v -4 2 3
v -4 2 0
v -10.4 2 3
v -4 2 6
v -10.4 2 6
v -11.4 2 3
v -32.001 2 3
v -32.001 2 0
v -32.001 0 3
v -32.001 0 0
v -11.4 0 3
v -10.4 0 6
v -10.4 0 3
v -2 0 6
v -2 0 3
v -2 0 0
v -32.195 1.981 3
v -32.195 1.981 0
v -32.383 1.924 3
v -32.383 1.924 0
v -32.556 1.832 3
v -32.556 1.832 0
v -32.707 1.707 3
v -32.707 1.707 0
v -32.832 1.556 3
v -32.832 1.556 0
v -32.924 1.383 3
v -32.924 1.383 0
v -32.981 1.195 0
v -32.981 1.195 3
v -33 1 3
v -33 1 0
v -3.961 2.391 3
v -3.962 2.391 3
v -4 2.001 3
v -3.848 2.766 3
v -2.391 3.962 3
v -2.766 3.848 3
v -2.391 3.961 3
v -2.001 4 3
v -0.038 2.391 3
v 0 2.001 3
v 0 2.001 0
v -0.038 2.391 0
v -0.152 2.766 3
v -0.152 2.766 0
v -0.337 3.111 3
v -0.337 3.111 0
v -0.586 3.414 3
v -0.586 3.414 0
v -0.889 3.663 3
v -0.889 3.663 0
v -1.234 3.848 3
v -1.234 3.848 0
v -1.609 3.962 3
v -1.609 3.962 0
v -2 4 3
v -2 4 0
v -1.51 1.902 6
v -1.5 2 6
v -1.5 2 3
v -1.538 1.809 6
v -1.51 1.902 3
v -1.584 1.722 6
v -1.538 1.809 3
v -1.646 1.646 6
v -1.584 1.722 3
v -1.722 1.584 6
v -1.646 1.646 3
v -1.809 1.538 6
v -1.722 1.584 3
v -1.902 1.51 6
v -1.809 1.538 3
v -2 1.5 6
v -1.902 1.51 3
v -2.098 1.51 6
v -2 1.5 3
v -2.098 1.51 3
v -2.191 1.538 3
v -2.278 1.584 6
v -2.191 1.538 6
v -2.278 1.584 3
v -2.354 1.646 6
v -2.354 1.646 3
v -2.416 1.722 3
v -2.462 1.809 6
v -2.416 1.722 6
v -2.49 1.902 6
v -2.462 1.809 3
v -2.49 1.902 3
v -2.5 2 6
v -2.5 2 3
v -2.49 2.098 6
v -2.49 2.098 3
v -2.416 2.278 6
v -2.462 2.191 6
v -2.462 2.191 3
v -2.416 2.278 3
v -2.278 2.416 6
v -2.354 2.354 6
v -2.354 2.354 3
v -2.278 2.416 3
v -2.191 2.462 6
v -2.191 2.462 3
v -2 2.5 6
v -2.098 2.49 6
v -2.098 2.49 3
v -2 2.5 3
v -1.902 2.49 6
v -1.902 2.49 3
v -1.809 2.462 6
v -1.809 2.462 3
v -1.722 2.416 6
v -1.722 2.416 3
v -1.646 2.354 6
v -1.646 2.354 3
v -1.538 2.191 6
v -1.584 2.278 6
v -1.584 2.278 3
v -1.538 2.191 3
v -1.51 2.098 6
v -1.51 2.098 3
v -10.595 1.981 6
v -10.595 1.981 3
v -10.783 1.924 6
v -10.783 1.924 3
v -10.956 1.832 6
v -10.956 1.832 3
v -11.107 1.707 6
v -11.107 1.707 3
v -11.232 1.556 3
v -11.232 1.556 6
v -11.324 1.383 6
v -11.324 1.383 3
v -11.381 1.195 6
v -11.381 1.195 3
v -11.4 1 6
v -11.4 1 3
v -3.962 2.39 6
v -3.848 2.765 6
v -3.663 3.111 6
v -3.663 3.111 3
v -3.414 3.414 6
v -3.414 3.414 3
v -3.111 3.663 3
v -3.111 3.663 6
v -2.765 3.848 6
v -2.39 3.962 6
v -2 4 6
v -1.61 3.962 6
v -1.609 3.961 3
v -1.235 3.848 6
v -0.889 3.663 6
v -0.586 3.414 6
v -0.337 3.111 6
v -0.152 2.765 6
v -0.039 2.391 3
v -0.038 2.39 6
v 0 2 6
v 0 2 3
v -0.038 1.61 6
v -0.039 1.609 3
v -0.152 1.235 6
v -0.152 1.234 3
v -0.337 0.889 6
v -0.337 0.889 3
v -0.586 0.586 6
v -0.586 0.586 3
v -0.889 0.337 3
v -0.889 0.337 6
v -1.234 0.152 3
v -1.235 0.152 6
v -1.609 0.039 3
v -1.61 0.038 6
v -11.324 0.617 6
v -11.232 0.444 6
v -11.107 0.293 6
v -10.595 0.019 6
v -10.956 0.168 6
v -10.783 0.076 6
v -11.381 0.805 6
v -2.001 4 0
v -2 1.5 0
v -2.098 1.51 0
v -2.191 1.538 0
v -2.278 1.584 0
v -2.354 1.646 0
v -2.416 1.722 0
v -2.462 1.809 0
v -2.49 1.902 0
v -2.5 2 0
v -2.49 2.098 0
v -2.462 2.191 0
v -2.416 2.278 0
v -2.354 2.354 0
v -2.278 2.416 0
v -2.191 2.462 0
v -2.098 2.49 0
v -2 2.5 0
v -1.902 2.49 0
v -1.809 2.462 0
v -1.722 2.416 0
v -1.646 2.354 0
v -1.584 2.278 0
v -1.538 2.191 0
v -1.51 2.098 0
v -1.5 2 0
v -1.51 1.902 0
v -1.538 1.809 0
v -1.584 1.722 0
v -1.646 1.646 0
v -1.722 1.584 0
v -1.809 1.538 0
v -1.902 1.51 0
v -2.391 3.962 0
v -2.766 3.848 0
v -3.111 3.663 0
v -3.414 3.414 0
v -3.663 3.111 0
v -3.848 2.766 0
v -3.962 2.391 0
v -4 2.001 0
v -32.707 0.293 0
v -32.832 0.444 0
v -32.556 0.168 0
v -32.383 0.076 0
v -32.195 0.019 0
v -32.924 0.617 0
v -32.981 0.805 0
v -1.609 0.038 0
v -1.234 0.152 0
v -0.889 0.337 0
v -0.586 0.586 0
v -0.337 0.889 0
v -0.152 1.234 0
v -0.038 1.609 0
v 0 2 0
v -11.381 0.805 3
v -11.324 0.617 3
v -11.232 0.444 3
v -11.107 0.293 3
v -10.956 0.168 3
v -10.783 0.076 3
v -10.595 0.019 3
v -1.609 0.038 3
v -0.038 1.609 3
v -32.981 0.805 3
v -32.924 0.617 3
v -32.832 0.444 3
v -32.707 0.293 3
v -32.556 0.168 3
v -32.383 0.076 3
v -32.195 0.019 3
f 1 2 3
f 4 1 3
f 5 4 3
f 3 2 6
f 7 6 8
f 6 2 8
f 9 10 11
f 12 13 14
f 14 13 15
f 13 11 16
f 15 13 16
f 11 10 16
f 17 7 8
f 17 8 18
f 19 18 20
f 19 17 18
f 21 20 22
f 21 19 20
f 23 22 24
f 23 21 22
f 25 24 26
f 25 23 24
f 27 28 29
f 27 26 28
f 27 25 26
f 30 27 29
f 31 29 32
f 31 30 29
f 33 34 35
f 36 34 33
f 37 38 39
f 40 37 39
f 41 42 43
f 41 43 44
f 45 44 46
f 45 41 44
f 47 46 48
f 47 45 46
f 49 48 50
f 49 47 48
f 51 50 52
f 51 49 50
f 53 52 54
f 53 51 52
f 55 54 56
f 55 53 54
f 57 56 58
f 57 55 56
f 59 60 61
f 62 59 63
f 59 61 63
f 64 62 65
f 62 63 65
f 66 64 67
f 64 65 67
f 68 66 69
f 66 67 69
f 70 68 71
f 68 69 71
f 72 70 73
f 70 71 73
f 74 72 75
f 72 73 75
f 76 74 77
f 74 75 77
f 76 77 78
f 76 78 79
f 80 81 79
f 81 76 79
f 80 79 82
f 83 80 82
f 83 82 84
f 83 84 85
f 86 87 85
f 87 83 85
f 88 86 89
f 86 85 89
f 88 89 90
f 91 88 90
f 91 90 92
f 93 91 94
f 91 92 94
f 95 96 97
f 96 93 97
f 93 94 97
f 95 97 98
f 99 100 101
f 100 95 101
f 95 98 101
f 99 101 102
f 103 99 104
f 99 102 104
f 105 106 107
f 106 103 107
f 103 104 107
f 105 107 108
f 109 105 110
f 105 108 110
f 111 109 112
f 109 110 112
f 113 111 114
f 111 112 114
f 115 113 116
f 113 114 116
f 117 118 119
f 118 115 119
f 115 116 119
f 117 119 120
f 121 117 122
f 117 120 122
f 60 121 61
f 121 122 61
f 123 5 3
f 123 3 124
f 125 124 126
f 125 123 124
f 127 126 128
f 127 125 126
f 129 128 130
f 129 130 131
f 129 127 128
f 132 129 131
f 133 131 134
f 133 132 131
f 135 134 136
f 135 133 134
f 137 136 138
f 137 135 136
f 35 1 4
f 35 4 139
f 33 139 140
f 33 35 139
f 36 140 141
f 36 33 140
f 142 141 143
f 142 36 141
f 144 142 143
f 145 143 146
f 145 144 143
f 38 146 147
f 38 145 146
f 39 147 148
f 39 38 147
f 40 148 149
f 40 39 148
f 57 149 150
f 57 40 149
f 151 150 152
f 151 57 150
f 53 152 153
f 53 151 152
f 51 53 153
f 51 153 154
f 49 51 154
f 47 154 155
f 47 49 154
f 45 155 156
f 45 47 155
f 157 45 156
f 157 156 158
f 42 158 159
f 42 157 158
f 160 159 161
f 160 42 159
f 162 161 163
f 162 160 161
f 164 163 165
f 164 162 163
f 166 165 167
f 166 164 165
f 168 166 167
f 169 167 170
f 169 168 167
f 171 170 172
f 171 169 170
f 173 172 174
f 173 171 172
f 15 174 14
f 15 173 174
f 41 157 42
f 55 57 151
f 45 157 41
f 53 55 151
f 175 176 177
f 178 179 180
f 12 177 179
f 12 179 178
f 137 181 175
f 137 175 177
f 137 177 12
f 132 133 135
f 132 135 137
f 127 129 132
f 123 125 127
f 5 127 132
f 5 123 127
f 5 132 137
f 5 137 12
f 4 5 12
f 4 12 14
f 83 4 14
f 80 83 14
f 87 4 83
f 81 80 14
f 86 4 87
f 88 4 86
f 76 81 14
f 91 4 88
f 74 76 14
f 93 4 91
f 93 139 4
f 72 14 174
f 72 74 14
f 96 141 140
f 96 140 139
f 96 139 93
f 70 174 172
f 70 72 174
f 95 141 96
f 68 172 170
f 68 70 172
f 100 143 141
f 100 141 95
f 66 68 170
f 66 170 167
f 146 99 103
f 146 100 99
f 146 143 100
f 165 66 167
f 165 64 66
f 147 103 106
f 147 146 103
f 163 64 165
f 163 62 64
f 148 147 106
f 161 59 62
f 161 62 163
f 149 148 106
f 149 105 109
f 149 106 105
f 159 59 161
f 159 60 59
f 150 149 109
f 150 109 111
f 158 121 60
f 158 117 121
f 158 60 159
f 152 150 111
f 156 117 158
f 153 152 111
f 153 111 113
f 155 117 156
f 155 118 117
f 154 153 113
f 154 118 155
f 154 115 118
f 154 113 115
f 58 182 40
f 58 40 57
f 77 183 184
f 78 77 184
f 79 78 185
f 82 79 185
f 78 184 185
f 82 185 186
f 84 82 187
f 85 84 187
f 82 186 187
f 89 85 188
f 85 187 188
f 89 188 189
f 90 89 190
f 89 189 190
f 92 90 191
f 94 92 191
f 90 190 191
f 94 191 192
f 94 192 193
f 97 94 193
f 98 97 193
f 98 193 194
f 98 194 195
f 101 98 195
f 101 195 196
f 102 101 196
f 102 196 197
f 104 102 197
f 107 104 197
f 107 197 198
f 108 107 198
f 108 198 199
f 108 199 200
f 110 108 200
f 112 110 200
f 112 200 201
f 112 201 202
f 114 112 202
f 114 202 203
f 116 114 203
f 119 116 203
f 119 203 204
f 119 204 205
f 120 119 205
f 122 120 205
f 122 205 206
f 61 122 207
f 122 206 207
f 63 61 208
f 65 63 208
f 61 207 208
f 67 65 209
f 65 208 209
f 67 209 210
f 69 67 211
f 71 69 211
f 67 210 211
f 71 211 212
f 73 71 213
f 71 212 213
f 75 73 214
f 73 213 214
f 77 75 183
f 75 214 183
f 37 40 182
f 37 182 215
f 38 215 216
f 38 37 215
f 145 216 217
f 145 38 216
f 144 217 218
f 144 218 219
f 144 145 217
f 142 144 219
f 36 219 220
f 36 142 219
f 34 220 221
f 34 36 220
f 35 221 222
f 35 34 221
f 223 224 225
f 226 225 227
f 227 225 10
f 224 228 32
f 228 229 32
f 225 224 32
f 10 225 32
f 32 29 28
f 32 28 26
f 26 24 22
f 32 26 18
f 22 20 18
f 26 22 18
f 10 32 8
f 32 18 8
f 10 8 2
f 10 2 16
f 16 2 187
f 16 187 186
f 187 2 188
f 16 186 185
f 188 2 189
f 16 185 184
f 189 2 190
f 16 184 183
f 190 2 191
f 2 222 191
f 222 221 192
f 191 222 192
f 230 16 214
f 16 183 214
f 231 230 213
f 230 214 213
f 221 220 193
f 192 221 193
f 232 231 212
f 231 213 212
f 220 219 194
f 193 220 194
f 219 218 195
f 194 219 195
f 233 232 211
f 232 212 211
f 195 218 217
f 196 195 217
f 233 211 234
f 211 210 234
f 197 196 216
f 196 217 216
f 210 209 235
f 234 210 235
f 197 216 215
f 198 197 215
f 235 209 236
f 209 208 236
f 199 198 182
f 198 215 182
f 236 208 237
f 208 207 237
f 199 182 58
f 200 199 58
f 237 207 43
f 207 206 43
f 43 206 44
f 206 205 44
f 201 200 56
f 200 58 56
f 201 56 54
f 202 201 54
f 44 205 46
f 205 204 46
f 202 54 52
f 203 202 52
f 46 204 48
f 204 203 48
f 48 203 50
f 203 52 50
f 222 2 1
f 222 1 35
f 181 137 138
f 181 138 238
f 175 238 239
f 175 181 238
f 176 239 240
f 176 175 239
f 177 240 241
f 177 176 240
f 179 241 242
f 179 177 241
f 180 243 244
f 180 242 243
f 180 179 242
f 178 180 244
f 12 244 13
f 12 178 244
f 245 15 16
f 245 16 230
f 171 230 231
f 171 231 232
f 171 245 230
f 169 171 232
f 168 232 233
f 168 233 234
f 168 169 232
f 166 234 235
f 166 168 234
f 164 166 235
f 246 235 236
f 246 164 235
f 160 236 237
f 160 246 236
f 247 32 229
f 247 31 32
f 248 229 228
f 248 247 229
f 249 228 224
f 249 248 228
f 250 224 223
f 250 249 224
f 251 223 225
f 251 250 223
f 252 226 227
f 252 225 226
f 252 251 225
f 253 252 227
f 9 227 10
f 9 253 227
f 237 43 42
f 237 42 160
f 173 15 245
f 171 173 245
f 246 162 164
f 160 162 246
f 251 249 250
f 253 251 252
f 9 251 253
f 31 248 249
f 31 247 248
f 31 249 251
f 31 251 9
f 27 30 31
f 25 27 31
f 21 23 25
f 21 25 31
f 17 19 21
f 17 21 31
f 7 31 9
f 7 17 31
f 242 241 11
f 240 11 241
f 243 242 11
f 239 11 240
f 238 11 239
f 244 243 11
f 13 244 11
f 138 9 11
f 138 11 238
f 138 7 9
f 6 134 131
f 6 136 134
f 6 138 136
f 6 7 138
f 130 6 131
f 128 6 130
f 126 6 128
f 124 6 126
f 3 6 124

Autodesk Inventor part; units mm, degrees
ref_plane "YZ Plane" through (0, 0, 0) normal (1, 0, 0) x (0, 1, 0)
ref_plane "XZ Plane" through (0, 0, 0) normal (0, 1, 0) x (-1, 0, 0)
ref_plane "XY Plane" through (0, 0, 0) normal (0, 0, 1) x (1, 0, 0)
sketch "Sketch1" plane through (0, 0, 0) normal (0, 0, 1) x (1, 0, 0)
  line L0 (0, 0) -> (-4, 0)
  line L1 (-4, 0) -> (-4, 4)
  line L2 (-4, 4) -> (0, 4)
  line L3 (0, 4) -> (0, 0)
  line L4 (-4, 0) -> (-33, 0)
  line L5 (-33, 0) -> (-33, 2)
  line L6 (-33, 2) -> (-4, 2)
  line L7 (-4, 2) -> (-4, 0)
  dimension "d1" = 4
  dimension "d3" = 29
  dimension "d4" = 2
extrude "Soporte Hoja" add sketch "Sketch1" along normal blind 3
fillet "Cabeza" radius 2 3 edges at (0, 0, 1.5) (0, 4, 1.5) (-4, 4, 1.5)
fillet "Agarre Hoja" radius 1 2 edges at (-33, 0, 1.5) (-33, 2, 1.5)
sketch "Sketch2" plane through (0, 0, 3) normal (0, 0, 1) x (1, 0, 0)
  circle A0 centre (-2, 2) radius 0.5
  arc A1 (-2, 0) -> (-4, 2) centre (-2, 2) ccw projected
  point P0 (0, 0)
  dimension "d9" = 1
hole "Eje" at (-2, 2, 3) direction (0, 0, -1) diameter 1 end through all
sketch "Sketch3" plane through (0, 0, 3) normal (0, 0, 1) x (1, 0, 0)
  line L0 (-4, 2) -> (-32, 2) projected
  line L1 (-32, 0) -> (-2, 0) projected
  line L2 (-4, 2) -> (-32, 2) projected
  line L3 (-11.4, 2) -> (-11.4, 0)
  line L4 (-32, 0) -> (-2, 0) projected
  arc A0 (-2, 0) -> (-4, 2) centre (-2, 2) ccw projected
  circle A1 centre (-2, 2) radius 0.5 projected
  point P0 (0, 0)
  dimension "d17" = 11.4
extrude "Soporte Deslizador" add sketch "Sketch3" along normal blind 3
fillet "Agarre Deslizador" radius 1 2 edges at (-11.4, 0, 4.5) (-11.4, 2, 4.5)
equation "\"d1\" = traba_cabeza_ancho"
equation "\"d3\" = traba_largo"
equation "\"d4\" = traba_hoja_ancho"
equation "\"d5\" = traba_hoja_grosor"
equation "\"d7\" = 0.5 * traba_cabeza_ancho"
equation "\"d8\" = 0.5 * traba_hoja_ancho"
equation "\"d10\" = traba_eje_diametro"
equation "\"d17\" = traba_deslizador_largo"
equation "\"d18\" = traba_deslizador_alto"
equation "\"d20\" = 0.5 * traba_hoja_ancho"
equation "\"traba_cabeza_ancho\" = 4"
equation "\"traba_largo\" = 29"
equation "\"traba_hoja_ancho\" = 2"
equation "\"traba_hoja_grosor\" = 3"
equation "\"traba_eje_diametro\" = 1"
equation "\"traba_deslizador_alto\" = 3"
equation "\"traba_deslizador_largo\" = 11.4"
properties part number "Traba"
